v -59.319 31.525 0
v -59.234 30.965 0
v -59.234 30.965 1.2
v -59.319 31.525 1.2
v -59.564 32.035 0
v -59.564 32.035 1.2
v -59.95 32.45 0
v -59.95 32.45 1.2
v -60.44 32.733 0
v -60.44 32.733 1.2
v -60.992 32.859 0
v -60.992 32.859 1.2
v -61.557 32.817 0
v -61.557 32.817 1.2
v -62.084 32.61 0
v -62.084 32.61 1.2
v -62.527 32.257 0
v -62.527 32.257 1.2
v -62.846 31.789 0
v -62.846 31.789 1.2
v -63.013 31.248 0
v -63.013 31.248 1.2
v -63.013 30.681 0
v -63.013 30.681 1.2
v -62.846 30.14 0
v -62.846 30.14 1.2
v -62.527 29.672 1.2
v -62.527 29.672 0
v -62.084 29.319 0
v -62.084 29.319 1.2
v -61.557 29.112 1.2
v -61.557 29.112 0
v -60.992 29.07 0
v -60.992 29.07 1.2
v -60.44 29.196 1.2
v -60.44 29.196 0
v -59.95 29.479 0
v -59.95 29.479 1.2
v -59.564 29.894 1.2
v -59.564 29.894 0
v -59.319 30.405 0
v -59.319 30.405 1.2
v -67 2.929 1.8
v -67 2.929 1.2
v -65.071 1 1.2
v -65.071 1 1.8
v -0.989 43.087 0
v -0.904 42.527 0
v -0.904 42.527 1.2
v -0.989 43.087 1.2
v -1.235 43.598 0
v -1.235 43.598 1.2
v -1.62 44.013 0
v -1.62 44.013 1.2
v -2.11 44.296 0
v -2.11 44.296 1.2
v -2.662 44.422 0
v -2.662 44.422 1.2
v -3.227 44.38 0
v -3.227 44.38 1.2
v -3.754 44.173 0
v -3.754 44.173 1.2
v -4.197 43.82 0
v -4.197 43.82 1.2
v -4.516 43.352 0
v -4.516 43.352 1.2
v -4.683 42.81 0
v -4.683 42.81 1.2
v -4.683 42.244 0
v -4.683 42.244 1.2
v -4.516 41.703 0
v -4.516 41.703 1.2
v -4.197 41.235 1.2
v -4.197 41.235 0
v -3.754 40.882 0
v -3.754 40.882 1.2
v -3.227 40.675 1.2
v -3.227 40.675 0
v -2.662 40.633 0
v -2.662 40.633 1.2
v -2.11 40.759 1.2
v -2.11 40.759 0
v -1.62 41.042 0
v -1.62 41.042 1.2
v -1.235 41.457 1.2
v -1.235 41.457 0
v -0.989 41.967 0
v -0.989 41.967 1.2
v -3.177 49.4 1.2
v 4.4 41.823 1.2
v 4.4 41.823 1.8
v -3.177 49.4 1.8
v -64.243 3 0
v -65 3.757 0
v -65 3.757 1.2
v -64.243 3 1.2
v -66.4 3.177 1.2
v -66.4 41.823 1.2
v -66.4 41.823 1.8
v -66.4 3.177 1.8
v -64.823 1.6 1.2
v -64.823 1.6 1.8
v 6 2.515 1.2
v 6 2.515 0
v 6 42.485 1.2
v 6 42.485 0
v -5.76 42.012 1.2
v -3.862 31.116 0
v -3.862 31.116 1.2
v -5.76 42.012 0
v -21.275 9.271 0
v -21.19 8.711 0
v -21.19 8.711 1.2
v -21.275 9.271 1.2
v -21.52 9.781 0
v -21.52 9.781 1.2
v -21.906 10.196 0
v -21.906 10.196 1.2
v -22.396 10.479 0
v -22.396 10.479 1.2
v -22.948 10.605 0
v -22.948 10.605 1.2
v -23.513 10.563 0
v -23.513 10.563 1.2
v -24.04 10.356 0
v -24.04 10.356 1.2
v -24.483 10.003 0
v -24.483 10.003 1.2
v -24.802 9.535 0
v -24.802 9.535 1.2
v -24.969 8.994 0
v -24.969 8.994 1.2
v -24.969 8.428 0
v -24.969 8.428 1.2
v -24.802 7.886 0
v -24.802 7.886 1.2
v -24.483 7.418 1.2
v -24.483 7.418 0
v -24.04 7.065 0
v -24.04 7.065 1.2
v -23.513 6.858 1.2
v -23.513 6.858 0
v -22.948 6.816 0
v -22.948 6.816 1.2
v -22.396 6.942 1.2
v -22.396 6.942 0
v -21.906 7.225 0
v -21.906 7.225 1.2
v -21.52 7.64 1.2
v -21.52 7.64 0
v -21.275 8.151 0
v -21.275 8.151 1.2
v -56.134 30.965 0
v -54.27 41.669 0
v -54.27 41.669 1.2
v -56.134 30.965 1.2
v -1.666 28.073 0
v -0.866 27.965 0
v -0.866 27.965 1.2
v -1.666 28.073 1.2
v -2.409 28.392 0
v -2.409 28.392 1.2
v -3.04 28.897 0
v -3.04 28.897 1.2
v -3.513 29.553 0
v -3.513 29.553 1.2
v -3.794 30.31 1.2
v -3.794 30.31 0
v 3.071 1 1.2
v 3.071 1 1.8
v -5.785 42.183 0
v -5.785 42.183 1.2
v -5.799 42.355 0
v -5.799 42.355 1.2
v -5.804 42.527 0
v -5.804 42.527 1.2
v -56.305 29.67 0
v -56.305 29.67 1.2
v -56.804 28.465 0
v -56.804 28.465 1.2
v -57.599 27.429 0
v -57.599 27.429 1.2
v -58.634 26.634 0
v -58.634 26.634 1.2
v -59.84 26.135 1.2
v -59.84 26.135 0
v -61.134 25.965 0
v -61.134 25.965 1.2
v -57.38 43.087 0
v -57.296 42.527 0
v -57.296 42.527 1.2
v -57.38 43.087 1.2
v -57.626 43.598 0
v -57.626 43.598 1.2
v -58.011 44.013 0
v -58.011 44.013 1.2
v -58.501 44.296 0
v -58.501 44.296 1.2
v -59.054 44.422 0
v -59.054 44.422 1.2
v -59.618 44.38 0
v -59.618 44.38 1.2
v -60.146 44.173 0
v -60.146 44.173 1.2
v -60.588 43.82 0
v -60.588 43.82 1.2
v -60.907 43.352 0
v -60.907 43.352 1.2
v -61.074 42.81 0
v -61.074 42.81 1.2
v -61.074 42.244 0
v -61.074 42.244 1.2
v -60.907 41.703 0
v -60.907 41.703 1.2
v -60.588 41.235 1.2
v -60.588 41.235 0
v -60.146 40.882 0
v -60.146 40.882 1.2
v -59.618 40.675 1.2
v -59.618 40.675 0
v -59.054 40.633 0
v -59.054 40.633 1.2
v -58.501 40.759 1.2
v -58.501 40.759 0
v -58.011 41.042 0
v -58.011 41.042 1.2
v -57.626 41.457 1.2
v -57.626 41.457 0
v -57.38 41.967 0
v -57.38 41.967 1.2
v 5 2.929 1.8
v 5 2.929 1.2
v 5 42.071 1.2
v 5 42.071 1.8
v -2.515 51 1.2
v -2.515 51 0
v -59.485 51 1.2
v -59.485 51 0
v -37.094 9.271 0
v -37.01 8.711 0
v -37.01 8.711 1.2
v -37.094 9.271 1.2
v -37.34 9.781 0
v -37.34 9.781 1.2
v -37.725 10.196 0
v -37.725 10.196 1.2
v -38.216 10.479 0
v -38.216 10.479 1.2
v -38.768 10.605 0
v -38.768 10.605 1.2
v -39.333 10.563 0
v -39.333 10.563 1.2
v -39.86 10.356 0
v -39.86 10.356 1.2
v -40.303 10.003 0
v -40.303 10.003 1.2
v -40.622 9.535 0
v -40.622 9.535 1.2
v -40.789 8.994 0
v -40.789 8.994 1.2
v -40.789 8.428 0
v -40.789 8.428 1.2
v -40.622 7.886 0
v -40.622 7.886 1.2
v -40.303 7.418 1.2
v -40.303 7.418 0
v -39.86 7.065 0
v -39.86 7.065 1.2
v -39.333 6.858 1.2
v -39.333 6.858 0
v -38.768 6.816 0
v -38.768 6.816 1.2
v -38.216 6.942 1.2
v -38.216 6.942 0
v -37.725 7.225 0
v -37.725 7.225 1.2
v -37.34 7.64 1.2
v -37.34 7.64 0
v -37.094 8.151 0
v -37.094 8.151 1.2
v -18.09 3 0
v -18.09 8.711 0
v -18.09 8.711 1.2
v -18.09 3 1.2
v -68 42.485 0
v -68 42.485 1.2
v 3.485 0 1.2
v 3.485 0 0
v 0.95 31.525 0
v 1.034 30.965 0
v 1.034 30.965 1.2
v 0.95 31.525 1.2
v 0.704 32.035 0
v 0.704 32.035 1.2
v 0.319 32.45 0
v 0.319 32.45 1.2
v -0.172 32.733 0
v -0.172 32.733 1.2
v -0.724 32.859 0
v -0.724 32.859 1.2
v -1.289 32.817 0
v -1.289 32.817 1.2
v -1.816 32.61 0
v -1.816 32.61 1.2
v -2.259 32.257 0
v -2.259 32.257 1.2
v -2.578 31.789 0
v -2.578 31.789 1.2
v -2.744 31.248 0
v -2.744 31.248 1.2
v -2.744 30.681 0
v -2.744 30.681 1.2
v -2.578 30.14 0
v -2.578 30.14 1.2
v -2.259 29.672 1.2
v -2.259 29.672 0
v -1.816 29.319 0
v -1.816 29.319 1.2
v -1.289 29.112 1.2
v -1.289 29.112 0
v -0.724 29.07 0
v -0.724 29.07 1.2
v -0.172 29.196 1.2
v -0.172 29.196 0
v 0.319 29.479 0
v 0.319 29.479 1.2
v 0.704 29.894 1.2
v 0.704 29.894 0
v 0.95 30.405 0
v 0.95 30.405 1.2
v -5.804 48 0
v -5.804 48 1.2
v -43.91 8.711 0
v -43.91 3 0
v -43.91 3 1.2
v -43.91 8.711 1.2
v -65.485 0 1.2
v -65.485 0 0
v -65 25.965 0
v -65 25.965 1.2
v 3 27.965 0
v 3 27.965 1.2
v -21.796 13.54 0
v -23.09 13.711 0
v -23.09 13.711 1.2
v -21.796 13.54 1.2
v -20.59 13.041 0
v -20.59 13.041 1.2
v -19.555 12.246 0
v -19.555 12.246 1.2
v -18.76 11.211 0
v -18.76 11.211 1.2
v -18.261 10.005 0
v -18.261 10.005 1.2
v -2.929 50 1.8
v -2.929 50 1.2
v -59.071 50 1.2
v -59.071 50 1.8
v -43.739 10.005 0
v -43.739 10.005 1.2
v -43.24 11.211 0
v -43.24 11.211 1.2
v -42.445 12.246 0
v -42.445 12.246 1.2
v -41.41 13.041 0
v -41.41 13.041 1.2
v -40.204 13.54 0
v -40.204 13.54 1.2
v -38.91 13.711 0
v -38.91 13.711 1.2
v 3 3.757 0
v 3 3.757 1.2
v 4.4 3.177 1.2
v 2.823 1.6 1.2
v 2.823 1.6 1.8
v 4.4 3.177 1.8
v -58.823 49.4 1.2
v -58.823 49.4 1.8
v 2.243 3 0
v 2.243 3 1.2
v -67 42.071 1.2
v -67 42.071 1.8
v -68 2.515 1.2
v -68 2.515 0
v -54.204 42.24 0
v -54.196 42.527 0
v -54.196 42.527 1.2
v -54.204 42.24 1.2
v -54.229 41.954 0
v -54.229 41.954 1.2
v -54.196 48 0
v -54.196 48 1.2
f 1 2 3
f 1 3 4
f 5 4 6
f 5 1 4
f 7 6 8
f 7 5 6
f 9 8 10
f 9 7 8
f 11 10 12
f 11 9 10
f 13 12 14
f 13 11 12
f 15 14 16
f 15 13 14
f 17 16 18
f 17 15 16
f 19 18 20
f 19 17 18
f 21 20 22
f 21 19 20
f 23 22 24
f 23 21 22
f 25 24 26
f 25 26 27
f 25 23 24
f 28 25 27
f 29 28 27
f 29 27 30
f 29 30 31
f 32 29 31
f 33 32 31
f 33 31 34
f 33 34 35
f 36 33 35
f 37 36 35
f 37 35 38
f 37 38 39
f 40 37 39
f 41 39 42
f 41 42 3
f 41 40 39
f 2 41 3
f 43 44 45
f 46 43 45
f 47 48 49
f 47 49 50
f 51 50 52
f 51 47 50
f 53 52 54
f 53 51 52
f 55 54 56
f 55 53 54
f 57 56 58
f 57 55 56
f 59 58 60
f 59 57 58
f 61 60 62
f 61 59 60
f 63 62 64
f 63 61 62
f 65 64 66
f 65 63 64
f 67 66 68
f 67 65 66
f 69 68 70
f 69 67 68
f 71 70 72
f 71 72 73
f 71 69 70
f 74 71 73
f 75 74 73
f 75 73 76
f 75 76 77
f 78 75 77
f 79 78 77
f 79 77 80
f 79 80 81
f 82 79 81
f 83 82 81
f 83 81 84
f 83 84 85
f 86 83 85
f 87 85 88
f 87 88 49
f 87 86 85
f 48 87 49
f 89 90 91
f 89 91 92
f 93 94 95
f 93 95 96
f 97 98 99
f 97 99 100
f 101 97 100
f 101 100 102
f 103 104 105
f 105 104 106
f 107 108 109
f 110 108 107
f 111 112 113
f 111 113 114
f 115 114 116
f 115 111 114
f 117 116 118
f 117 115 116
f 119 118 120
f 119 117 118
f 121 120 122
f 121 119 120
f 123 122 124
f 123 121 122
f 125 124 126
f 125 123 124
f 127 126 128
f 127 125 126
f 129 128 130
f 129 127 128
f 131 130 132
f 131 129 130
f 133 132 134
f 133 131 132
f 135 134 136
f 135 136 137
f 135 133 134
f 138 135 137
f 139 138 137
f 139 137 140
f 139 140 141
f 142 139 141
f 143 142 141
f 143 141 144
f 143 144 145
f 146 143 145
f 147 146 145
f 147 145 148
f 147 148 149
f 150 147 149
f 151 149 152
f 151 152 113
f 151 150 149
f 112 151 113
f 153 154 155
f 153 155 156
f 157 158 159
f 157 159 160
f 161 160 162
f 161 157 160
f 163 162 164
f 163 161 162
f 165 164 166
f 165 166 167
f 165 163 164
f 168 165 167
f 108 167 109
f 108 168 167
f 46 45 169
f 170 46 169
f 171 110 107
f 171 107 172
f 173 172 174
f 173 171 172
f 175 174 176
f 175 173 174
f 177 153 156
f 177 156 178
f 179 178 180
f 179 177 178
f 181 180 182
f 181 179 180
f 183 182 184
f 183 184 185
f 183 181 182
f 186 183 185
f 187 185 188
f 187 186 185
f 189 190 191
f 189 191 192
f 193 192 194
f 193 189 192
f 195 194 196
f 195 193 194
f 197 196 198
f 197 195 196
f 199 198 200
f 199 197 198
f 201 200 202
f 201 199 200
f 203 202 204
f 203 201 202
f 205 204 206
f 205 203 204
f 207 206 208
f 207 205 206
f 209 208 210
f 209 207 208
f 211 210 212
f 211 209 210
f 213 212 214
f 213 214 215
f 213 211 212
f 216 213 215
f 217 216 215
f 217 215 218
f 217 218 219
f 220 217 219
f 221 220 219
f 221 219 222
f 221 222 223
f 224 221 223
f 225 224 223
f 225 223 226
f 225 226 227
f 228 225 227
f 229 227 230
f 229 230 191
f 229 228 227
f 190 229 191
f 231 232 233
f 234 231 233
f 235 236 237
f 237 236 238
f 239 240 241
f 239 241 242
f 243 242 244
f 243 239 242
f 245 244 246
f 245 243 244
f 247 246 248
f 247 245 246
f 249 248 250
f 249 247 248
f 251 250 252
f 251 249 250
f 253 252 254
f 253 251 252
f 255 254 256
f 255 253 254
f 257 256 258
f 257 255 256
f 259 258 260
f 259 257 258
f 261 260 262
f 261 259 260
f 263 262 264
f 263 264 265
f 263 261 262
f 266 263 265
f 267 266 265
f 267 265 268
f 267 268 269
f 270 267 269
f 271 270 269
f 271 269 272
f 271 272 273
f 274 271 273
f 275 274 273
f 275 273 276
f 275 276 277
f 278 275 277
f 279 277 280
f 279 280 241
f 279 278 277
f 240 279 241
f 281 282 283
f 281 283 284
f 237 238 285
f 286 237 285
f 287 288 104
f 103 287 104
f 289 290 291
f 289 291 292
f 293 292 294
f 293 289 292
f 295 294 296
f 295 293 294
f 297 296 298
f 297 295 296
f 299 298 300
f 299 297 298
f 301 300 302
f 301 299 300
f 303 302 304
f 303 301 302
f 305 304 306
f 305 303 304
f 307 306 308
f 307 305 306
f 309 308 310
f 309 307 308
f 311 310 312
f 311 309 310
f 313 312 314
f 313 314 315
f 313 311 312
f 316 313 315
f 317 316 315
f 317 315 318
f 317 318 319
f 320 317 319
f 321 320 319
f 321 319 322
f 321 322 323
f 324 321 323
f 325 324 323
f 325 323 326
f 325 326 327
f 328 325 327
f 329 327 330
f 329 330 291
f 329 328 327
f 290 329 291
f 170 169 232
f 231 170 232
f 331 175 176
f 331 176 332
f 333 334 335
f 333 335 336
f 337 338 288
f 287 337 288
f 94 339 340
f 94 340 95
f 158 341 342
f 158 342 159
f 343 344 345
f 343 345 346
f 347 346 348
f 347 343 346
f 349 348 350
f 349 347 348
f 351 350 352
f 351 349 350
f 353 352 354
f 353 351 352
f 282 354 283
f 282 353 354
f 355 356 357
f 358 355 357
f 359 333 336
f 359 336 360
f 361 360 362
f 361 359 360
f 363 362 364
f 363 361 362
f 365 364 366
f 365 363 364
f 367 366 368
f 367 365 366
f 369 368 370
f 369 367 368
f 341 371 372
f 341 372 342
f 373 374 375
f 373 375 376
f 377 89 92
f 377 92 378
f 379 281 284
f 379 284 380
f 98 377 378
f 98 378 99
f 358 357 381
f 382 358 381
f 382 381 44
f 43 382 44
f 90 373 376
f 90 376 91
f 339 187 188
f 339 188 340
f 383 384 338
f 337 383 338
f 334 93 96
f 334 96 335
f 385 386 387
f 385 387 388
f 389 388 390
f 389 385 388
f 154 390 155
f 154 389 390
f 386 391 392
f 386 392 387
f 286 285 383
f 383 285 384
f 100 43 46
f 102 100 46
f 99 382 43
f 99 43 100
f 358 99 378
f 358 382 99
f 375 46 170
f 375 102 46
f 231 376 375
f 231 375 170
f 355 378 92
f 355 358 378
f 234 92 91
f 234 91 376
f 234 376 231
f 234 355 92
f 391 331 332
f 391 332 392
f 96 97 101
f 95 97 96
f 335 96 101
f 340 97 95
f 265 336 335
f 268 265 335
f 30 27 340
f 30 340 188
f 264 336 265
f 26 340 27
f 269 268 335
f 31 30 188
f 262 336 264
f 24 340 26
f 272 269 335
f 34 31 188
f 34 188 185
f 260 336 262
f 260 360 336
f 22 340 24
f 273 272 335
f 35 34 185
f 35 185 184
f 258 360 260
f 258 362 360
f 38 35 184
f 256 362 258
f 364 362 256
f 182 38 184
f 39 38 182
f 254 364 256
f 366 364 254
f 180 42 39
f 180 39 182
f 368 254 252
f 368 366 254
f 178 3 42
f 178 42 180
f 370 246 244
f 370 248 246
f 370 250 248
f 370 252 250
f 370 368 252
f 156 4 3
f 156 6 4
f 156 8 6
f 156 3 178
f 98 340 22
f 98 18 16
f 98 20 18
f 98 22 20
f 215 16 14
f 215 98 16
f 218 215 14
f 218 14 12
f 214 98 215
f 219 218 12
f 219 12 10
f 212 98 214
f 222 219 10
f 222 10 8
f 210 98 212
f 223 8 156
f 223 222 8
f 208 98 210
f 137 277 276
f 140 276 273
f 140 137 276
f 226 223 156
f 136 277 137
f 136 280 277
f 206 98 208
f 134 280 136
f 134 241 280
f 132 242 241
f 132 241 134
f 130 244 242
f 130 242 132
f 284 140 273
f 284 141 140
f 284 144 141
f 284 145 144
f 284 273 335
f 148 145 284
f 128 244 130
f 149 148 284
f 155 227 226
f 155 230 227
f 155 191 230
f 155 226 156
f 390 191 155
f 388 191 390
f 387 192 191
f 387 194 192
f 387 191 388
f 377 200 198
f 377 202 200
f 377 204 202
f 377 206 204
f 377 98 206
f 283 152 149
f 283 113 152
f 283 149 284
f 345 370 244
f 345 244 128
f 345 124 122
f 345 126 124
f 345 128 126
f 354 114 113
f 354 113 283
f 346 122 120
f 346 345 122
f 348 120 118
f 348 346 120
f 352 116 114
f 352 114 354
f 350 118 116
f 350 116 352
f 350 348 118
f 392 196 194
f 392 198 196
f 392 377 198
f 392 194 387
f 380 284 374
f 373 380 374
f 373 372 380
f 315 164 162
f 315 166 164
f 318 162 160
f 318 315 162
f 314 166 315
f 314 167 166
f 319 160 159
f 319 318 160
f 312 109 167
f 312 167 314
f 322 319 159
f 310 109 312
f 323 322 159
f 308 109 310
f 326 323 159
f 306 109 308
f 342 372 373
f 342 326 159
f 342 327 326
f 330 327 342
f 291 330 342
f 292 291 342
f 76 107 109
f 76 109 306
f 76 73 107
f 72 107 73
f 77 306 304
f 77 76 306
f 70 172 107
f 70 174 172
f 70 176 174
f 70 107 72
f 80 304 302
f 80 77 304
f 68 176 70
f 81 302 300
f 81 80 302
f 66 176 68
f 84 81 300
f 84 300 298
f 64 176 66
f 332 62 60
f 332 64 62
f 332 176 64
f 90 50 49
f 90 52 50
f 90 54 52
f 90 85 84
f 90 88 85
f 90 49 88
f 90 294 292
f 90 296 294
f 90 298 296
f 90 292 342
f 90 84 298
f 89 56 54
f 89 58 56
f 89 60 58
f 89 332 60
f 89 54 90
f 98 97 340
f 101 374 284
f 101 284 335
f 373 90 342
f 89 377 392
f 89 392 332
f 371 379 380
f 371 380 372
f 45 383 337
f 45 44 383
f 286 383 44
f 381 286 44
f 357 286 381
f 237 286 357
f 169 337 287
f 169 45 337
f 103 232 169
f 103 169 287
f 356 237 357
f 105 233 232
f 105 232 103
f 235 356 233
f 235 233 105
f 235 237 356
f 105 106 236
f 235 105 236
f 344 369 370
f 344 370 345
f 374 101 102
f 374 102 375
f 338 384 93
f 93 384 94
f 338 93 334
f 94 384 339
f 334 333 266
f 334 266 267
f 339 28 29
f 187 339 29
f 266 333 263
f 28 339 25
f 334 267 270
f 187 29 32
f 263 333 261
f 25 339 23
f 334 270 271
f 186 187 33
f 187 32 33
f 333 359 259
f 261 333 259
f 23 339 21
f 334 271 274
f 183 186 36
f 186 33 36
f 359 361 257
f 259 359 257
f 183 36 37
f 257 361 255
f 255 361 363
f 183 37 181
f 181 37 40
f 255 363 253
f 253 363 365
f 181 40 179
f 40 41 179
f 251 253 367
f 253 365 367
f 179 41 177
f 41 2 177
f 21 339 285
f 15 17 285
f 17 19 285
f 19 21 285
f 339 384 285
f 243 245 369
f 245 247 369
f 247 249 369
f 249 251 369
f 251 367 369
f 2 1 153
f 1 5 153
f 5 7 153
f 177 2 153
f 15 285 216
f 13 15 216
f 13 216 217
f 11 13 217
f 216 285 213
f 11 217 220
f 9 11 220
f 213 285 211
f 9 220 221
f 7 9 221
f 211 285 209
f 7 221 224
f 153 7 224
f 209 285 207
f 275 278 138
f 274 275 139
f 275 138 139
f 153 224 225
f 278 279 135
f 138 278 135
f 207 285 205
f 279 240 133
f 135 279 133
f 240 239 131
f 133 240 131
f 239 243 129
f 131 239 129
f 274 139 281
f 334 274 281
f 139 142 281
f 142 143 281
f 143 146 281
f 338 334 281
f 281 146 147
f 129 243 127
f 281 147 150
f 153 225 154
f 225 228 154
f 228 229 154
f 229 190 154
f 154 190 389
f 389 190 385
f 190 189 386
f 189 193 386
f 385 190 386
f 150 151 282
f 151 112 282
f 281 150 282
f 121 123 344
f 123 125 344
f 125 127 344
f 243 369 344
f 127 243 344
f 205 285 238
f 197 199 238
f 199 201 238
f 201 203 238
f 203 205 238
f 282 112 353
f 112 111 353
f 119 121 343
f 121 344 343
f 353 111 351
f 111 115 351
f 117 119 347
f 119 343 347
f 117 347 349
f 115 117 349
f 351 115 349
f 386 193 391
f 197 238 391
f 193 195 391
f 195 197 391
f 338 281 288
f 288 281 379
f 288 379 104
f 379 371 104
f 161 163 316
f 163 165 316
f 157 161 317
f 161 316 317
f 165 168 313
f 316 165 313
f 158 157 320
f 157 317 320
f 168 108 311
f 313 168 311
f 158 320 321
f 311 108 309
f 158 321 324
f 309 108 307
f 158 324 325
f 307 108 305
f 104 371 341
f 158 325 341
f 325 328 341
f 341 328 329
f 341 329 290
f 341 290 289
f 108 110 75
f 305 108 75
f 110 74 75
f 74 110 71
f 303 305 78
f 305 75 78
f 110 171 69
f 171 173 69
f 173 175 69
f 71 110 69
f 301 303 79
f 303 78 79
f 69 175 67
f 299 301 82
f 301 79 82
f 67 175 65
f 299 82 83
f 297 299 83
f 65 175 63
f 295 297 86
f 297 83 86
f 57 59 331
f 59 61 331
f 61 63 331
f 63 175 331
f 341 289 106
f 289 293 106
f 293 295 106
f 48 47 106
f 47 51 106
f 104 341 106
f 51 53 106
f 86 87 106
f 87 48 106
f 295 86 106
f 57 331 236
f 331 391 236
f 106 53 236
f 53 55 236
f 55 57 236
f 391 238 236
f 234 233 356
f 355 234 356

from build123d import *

# Parameters (mm, degrees)
SKETCH1_R           = 1.9
BOSS_EXTRUDE1_DEPTH = 1.2
BOSS_EXTRUDE2_DEPTH = 0.6


with BuildPart() as part:
    # Sketch1 → Boss-Extrude1 (new body)
    with BuildSketch(Plane.XY):
        Polygon((-68, 2.514718626), (-65.485281374, 0), (3.485281374, 0), (6, 2.514718626), (6, 42.485281374), (-2.514718626, 51), (-59.485281374, 51), (-68, 42.485281374), align=None)
        with Locations((-0.865721015, 30.964560447)):
            Circle(SKETCH1_R, mode=Mode.SUBTRACT)
        with Locations((-61.134278985, 30.964560447)):
            Circle(SKETCH1_R, mode=Mode.SUBTRACT)
        with Locations((-38.909782256, 8.710806253)):
            Circle(SKETCH1_R, mode=Mode.SUBTRACT)
        with Locations((-23.090217744, 8.710806253)):
            Circle(SKETCH1_R, mode=Mode.SUBTRACT)
        with Locations((-2.804444182, 42.527253566)):
            Circle(SKETCH1_R, mode=Mode.SUBTRACT)
        with Locations((-59.195555818, 42.527253566)):
            Circle(SKETCH1_R, mode=Mode.SUBTRACT)
        with BuildLine():
            Line((3, 27.964560447), (-0.865721015, 27.964560447))
            ThreePointArc((-0.865721015, 27.964560447), (-3.039785544, 28.897329588), (-3.861916537, 31.115598164))
            Line((-3.861916537, 31.115598164), (-5.759945542, 42.01246068))
            ThreePointArc((-5.759945542, 42.01246068), (-5.793298819, 42.268897298), (-5.804444182, 42.527253566))
            Line((-5.804444182, 42.527253566), (-5.804444182, 48))
            Line((-5.804444182, 48), (-54.195555818, 48))
            Line((-54.195555818, 48), (-54.195555818, 42.527253566))
            ThreePointArc((-54.195555818, 42.527253566), (-54.214131423, 42.096659786), (-54.269720219, 41.669265423))
            Line((-54.269720219, 41.669265423), (-56.134278985, 30.964560447))
            ThreePointArc((-56.134278985, 30.964560447), (-57.598745079, 27.429026541), (-61.134278985, 25.964560447))
            Line((-61.134278985, 25.964560447), (-65, 25.964560447))
            Line((-65, 25.964560447), (-65, 3.757359313))
            Line((-65, 3.757359313), (-64.242640687, 3))
            Line((-64.242640687, 3), (-43.909782256, 3))
            Line((-43.909782256, 3), (-43.909782256, 8.710806253))
            ThreePointArc((-43.909782256, 8.710806253), (-42.445316162, 12.246340159), (-38.909782256, 13.710806253))
            Line((-38.909782256, 13.710806253), (-23.090217744, 13.710806253))
            ThreePointArc((-23.090217744, 13.710806253), (-19.554683838, 12.246340159), (-18.090217744, 8.710806253))
            Line((-18.090217744, 8.710806253), (-18.090217744, 3))
            Line((-18.090217744, 3), (2.242640687, 3))
            Line((2.242640687, 3), (3, 3.757359313))
            Line((3, 3.757359313), (3, 27.964560447))
        make_face(mode=Mode.SUBTRACT)
    extrude(amount=BOSS_EXTRUDE1_DEPTH)

    # Sketch2 → Boss-Extrude2 (add)
    with BuildSketch(Plane.XY.offset(1.2)):
        Polygon((-67, 42.071067812), (-67, 2.928932188), (-65.071067812, 1), (3.071067812, 1), (5, 2.928932188), (5, 42.071067812), (-2.928932188, 50), (-59.071067812, 50), align=None)
        Polygon((-66.4, 41.822539674), (-66.4, 3.177460326), (-64.822539674, 1.6), (2.822539674, 1.6), (4.4, 3.177460326), (4.4, 41.822539674), (-3.177460326, 49.4), (-58.822539674, 49.4), align=None, mode=Mode.SUBTRACT)
    extrude(amount=BOSS_EXTRUDE2_DEPTH)


solid = part.part
